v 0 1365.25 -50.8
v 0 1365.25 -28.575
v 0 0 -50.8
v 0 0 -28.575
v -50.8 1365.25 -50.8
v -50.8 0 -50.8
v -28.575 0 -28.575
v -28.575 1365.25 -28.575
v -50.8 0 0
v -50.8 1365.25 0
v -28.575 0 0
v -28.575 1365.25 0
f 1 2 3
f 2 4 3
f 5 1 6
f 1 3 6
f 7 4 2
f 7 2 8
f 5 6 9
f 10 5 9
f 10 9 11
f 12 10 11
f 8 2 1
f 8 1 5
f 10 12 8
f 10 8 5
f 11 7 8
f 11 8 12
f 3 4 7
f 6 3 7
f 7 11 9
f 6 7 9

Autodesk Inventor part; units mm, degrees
ref_plane "YZ Plane" through (0, 0, 0) normal (1, 0, 0) x (0, 1, 0)
ref_plane "XZ Plane" through (0, 0, 0) normal (0, 1, 0) x (-1, 0, 0)
ref_plane "XY Plane" through (0, 0, 0) normal (0, 0, 1) x (1, 0, 0)
sketch "Sketch1" plane through (0, 0, 0) normal (0, 1, 0) x (-1, 0, 0)
  line L0 (0, -50.8) -> (50.8, -50.8)
  line L1 (50.8, -50.8) -> (50.8, 0)
  line L2 (-50.8, 50.8) -> (50.8, -50.8) construction
  line L3 (-50.8, -50.8) -> (50.8, 50.8) construction
  line L4 (0, -28.575) -> (28.575, -28.575)
  line L5 (28.575, -28.575) -> (28.575, 0)
  line L6 (-28.575, 28.575) -> (28.575, -28.575) construction
  line L7 (-28.575, -28.575) -> (28.575, 28.575) construction
  line L8 (50.8, 0) -> (28.575, 0)
  line L9 (0, -28.575) -> (0, -50.8)
  point P0 (0, 0)
  dimension "d2" = 50.8
extrude "Extrusion1" add sketch "Sketch1" along normal blind 1365.25
properties part number "Molding 4 ft 5 3_4 in"
